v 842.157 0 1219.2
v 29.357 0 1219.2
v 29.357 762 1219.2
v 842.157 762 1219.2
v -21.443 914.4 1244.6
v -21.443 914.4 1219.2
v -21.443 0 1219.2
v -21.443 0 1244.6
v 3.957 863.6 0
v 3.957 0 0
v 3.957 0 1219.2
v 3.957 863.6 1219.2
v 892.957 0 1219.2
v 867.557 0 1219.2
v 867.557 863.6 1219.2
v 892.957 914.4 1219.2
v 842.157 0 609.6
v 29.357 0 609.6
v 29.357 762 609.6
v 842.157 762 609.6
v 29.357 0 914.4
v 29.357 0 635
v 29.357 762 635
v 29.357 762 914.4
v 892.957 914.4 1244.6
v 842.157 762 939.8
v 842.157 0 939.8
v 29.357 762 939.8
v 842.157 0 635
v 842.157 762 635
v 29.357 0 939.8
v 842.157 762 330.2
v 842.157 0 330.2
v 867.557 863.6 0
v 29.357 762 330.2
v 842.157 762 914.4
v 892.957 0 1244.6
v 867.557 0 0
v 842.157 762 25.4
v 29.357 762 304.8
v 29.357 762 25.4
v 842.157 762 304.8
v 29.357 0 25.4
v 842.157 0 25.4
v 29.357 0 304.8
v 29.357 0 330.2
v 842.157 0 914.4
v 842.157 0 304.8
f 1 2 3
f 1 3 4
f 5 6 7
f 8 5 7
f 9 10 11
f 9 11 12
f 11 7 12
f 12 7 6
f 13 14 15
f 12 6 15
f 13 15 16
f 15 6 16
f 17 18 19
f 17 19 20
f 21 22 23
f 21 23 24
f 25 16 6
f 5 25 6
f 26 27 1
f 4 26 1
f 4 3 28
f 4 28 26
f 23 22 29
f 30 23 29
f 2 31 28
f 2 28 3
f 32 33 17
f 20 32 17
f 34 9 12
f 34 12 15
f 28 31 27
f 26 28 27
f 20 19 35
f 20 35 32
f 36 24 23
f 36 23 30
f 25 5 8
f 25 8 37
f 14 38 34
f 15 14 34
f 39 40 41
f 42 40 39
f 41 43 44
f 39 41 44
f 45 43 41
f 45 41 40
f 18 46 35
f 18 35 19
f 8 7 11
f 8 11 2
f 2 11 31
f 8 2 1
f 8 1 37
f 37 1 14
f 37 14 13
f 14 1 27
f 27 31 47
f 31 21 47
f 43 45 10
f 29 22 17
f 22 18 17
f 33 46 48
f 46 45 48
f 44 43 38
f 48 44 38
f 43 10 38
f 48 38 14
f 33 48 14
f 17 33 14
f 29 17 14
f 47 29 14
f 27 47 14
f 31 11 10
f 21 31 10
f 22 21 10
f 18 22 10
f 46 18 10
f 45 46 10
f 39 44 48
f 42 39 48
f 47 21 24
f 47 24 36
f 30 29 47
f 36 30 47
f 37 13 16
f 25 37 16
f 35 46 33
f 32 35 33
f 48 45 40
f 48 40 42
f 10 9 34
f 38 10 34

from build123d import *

# Parameters (mm, degrees)
F0_W     = 863.6
F0_H     = 863.6
F1_DEPTH = 1219.2
F2_W     = 863.6
F2_H     = 863.6
F3_DEPTH = 25.4
F4_W     = 812.8
F4_H     = 279.4
F5_DEPTH = 762


with BuildPart() as f1:
    # F0 (on Top) → F1 (new body)
    with BuildSketch(Plane.XY):
        with Locations((435.757004, 431.8)):
            Rectangle(F0_W, F0_H)
    extrude(amount=F1_DEPTH)

    # F2 (on face) → F3 (join)
    with BuildSketch(Plane.XY.offset(1219.2)):
        Polygon((867.557004, 863.6), (867.557004, 0), (892.957004, 0), (892.957004, 914.4), (-21.442996, 914.4), (-21.442996, 0), (3.957004, 0), (3.957004, 863.6), align=None)
        with Locations((435.757004, 431.8)):
            Rectangle(F2_W, F2_H)
    extrude(amount=F3_DEPTH)

    # F4 (on face) → F5 (cut)
    with BuildSketch(Plane.XZ):
        with Locations((435.757004, 1079.5)):
            Rectangle(F4_W, F4_H)
        with Locations((435.757004, 774.7)):
            Rectangle(F4_W, F4_H)
        with Locations((435.757004, 469.9)):
            Rectangle(F4_W, F4_H)
        with Locations((435.757004, 165.1)):
            Rectangle(F4_W, F4_H)
    extrude(amount=-F5_DEPTH, mode=Mode.SUBTRACT)


solid = f1.part
